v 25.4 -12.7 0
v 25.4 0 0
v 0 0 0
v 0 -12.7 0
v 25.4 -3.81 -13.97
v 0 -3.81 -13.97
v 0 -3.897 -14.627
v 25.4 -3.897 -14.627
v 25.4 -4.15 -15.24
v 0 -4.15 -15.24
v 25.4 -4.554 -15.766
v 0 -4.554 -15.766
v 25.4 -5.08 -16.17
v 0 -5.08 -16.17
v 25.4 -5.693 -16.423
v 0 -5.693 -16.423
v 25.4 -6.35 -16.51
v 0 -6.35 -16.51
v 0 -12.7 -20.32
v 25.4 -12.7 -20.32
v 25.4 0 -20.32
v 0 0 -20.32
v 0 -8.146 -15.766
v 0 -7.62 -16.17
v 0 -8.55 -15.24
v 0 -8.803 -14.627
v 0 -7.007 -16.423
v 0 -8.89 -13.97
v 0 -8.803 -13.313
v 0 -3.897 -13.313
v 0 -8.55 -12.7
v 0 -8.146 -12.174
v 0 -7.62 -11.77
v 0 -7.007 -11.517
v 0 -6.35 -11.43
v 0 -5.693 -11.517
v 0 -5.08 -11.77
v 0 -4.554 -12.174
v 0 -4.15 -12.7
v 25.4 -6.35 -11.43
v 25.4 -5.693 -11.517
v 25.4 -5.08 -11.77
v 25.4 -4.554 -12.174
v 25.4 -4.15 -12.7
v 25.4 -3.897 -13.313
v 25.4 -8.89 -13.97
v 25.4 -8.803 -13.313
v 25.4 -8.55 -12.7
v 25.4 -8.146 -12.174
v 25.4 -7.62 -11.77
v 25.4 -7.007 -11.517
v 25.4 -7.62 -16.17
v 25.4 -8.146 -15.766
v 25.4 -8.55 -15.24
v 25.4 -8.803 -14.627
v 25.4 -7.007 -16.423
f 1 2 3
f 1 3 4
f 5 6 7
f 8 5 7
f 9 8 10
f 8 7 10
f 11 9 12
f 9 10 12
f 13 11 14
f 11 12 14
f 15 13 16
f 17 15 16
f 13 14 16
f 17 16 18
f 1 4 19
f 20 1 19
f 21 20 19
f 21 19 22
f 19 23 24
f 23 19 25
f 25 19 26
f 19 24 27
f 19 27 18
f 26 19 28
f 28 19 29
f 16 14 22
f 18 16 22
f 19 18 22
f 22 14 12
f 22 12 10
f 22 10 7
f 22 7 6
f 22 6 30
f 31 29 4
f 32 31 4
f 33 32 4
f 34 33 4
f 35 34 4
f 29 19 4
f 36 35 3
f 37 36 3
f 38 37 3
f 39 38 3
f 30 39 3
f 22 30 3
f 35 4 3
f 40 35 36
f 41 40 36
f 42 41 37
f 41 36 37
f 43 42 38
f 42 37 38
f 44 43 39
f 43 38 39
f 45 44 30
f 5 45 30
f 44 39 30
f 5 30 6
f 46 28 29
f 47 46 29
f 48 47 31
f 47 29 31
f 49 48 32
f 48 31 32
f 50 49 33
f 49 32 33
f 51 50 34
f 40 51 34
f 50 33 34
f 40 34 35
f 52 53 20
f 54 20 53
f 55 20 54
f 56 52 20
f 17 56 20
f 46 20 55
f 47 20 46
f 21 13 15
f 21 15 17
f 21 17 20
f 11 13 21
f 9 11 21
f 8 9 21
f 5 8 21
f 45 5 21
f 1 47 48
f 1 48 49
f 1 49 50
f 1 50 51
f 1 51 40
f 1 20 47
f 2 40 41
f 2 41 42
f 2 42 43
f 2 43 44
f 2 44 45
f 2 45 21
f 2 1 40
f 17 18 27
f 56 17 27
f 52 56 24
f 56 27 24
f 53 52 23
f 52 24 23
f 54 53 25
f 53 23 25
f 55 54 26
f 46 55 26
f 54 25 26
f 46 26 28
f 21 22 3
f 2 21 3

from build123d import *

# Parameters (mm, degrees)
F1_DEPTH = 25.4


with BuildPart() as f1:
    # F0 (on Right) → F1 (new body)
    with BuildSketch(Plane.YZ):
        with BuildLine():
            Line((0, -13.97), (0, 0))
            Line((0, 0), (-6.35, 0))
            Line((-6.35, 0), (-6.35, -11.43))
            ThreePointArc((-6.35, -11.43), (-4.553949, -12.173949), (-3.81, -13.97))
            Line((-3.81, -13.97), (0, -13.97))
        make_face()
        with BuildLine():
            Line((-6.35, -11.43), (-6.35, 0))
            Line((-6.35, 0), (-12.7, 0))
            Line((-12.7, 0), (-12.7, -13.97))
            Line((-12.7, -13.97), (-8.89, -13.97))
            ThreePointArc((-8.89, -13.97), (-8.146051, -12.173949), (-6.35, -11.43))
        make_face()
        with BuildLine():
            Line((-8.89, -13.97), (-12.7, -13.97))
            Line((-12.7, -13.97), (-12.7, -20.32))
            Line((-12.7, -20.32), (-6.35, -20.32))
            Line((-6.35, -20.32), (-6.35, -16.51))
            ThreePointArc((-6.35, -16.51), (-8.146051, -15.766051), (-8.89, -13.97))
        make_face()
        with BuildLine():
            Line((0, -20.32), (0, -13.97))
            Line((0, -13.97), (-3.81, -13.97))
            ThreePointArc((-3.81, -13.97), (-4.553949, -15.766051), (-6.35, -16.51))
            Line((-6.35, -16.51), (-6.35, -20.32))
            Line((-6.35, -20.32), (0, -20.32))
        make_face()
    extrude(amount=F1_DEPTH)


solid = f1.part
